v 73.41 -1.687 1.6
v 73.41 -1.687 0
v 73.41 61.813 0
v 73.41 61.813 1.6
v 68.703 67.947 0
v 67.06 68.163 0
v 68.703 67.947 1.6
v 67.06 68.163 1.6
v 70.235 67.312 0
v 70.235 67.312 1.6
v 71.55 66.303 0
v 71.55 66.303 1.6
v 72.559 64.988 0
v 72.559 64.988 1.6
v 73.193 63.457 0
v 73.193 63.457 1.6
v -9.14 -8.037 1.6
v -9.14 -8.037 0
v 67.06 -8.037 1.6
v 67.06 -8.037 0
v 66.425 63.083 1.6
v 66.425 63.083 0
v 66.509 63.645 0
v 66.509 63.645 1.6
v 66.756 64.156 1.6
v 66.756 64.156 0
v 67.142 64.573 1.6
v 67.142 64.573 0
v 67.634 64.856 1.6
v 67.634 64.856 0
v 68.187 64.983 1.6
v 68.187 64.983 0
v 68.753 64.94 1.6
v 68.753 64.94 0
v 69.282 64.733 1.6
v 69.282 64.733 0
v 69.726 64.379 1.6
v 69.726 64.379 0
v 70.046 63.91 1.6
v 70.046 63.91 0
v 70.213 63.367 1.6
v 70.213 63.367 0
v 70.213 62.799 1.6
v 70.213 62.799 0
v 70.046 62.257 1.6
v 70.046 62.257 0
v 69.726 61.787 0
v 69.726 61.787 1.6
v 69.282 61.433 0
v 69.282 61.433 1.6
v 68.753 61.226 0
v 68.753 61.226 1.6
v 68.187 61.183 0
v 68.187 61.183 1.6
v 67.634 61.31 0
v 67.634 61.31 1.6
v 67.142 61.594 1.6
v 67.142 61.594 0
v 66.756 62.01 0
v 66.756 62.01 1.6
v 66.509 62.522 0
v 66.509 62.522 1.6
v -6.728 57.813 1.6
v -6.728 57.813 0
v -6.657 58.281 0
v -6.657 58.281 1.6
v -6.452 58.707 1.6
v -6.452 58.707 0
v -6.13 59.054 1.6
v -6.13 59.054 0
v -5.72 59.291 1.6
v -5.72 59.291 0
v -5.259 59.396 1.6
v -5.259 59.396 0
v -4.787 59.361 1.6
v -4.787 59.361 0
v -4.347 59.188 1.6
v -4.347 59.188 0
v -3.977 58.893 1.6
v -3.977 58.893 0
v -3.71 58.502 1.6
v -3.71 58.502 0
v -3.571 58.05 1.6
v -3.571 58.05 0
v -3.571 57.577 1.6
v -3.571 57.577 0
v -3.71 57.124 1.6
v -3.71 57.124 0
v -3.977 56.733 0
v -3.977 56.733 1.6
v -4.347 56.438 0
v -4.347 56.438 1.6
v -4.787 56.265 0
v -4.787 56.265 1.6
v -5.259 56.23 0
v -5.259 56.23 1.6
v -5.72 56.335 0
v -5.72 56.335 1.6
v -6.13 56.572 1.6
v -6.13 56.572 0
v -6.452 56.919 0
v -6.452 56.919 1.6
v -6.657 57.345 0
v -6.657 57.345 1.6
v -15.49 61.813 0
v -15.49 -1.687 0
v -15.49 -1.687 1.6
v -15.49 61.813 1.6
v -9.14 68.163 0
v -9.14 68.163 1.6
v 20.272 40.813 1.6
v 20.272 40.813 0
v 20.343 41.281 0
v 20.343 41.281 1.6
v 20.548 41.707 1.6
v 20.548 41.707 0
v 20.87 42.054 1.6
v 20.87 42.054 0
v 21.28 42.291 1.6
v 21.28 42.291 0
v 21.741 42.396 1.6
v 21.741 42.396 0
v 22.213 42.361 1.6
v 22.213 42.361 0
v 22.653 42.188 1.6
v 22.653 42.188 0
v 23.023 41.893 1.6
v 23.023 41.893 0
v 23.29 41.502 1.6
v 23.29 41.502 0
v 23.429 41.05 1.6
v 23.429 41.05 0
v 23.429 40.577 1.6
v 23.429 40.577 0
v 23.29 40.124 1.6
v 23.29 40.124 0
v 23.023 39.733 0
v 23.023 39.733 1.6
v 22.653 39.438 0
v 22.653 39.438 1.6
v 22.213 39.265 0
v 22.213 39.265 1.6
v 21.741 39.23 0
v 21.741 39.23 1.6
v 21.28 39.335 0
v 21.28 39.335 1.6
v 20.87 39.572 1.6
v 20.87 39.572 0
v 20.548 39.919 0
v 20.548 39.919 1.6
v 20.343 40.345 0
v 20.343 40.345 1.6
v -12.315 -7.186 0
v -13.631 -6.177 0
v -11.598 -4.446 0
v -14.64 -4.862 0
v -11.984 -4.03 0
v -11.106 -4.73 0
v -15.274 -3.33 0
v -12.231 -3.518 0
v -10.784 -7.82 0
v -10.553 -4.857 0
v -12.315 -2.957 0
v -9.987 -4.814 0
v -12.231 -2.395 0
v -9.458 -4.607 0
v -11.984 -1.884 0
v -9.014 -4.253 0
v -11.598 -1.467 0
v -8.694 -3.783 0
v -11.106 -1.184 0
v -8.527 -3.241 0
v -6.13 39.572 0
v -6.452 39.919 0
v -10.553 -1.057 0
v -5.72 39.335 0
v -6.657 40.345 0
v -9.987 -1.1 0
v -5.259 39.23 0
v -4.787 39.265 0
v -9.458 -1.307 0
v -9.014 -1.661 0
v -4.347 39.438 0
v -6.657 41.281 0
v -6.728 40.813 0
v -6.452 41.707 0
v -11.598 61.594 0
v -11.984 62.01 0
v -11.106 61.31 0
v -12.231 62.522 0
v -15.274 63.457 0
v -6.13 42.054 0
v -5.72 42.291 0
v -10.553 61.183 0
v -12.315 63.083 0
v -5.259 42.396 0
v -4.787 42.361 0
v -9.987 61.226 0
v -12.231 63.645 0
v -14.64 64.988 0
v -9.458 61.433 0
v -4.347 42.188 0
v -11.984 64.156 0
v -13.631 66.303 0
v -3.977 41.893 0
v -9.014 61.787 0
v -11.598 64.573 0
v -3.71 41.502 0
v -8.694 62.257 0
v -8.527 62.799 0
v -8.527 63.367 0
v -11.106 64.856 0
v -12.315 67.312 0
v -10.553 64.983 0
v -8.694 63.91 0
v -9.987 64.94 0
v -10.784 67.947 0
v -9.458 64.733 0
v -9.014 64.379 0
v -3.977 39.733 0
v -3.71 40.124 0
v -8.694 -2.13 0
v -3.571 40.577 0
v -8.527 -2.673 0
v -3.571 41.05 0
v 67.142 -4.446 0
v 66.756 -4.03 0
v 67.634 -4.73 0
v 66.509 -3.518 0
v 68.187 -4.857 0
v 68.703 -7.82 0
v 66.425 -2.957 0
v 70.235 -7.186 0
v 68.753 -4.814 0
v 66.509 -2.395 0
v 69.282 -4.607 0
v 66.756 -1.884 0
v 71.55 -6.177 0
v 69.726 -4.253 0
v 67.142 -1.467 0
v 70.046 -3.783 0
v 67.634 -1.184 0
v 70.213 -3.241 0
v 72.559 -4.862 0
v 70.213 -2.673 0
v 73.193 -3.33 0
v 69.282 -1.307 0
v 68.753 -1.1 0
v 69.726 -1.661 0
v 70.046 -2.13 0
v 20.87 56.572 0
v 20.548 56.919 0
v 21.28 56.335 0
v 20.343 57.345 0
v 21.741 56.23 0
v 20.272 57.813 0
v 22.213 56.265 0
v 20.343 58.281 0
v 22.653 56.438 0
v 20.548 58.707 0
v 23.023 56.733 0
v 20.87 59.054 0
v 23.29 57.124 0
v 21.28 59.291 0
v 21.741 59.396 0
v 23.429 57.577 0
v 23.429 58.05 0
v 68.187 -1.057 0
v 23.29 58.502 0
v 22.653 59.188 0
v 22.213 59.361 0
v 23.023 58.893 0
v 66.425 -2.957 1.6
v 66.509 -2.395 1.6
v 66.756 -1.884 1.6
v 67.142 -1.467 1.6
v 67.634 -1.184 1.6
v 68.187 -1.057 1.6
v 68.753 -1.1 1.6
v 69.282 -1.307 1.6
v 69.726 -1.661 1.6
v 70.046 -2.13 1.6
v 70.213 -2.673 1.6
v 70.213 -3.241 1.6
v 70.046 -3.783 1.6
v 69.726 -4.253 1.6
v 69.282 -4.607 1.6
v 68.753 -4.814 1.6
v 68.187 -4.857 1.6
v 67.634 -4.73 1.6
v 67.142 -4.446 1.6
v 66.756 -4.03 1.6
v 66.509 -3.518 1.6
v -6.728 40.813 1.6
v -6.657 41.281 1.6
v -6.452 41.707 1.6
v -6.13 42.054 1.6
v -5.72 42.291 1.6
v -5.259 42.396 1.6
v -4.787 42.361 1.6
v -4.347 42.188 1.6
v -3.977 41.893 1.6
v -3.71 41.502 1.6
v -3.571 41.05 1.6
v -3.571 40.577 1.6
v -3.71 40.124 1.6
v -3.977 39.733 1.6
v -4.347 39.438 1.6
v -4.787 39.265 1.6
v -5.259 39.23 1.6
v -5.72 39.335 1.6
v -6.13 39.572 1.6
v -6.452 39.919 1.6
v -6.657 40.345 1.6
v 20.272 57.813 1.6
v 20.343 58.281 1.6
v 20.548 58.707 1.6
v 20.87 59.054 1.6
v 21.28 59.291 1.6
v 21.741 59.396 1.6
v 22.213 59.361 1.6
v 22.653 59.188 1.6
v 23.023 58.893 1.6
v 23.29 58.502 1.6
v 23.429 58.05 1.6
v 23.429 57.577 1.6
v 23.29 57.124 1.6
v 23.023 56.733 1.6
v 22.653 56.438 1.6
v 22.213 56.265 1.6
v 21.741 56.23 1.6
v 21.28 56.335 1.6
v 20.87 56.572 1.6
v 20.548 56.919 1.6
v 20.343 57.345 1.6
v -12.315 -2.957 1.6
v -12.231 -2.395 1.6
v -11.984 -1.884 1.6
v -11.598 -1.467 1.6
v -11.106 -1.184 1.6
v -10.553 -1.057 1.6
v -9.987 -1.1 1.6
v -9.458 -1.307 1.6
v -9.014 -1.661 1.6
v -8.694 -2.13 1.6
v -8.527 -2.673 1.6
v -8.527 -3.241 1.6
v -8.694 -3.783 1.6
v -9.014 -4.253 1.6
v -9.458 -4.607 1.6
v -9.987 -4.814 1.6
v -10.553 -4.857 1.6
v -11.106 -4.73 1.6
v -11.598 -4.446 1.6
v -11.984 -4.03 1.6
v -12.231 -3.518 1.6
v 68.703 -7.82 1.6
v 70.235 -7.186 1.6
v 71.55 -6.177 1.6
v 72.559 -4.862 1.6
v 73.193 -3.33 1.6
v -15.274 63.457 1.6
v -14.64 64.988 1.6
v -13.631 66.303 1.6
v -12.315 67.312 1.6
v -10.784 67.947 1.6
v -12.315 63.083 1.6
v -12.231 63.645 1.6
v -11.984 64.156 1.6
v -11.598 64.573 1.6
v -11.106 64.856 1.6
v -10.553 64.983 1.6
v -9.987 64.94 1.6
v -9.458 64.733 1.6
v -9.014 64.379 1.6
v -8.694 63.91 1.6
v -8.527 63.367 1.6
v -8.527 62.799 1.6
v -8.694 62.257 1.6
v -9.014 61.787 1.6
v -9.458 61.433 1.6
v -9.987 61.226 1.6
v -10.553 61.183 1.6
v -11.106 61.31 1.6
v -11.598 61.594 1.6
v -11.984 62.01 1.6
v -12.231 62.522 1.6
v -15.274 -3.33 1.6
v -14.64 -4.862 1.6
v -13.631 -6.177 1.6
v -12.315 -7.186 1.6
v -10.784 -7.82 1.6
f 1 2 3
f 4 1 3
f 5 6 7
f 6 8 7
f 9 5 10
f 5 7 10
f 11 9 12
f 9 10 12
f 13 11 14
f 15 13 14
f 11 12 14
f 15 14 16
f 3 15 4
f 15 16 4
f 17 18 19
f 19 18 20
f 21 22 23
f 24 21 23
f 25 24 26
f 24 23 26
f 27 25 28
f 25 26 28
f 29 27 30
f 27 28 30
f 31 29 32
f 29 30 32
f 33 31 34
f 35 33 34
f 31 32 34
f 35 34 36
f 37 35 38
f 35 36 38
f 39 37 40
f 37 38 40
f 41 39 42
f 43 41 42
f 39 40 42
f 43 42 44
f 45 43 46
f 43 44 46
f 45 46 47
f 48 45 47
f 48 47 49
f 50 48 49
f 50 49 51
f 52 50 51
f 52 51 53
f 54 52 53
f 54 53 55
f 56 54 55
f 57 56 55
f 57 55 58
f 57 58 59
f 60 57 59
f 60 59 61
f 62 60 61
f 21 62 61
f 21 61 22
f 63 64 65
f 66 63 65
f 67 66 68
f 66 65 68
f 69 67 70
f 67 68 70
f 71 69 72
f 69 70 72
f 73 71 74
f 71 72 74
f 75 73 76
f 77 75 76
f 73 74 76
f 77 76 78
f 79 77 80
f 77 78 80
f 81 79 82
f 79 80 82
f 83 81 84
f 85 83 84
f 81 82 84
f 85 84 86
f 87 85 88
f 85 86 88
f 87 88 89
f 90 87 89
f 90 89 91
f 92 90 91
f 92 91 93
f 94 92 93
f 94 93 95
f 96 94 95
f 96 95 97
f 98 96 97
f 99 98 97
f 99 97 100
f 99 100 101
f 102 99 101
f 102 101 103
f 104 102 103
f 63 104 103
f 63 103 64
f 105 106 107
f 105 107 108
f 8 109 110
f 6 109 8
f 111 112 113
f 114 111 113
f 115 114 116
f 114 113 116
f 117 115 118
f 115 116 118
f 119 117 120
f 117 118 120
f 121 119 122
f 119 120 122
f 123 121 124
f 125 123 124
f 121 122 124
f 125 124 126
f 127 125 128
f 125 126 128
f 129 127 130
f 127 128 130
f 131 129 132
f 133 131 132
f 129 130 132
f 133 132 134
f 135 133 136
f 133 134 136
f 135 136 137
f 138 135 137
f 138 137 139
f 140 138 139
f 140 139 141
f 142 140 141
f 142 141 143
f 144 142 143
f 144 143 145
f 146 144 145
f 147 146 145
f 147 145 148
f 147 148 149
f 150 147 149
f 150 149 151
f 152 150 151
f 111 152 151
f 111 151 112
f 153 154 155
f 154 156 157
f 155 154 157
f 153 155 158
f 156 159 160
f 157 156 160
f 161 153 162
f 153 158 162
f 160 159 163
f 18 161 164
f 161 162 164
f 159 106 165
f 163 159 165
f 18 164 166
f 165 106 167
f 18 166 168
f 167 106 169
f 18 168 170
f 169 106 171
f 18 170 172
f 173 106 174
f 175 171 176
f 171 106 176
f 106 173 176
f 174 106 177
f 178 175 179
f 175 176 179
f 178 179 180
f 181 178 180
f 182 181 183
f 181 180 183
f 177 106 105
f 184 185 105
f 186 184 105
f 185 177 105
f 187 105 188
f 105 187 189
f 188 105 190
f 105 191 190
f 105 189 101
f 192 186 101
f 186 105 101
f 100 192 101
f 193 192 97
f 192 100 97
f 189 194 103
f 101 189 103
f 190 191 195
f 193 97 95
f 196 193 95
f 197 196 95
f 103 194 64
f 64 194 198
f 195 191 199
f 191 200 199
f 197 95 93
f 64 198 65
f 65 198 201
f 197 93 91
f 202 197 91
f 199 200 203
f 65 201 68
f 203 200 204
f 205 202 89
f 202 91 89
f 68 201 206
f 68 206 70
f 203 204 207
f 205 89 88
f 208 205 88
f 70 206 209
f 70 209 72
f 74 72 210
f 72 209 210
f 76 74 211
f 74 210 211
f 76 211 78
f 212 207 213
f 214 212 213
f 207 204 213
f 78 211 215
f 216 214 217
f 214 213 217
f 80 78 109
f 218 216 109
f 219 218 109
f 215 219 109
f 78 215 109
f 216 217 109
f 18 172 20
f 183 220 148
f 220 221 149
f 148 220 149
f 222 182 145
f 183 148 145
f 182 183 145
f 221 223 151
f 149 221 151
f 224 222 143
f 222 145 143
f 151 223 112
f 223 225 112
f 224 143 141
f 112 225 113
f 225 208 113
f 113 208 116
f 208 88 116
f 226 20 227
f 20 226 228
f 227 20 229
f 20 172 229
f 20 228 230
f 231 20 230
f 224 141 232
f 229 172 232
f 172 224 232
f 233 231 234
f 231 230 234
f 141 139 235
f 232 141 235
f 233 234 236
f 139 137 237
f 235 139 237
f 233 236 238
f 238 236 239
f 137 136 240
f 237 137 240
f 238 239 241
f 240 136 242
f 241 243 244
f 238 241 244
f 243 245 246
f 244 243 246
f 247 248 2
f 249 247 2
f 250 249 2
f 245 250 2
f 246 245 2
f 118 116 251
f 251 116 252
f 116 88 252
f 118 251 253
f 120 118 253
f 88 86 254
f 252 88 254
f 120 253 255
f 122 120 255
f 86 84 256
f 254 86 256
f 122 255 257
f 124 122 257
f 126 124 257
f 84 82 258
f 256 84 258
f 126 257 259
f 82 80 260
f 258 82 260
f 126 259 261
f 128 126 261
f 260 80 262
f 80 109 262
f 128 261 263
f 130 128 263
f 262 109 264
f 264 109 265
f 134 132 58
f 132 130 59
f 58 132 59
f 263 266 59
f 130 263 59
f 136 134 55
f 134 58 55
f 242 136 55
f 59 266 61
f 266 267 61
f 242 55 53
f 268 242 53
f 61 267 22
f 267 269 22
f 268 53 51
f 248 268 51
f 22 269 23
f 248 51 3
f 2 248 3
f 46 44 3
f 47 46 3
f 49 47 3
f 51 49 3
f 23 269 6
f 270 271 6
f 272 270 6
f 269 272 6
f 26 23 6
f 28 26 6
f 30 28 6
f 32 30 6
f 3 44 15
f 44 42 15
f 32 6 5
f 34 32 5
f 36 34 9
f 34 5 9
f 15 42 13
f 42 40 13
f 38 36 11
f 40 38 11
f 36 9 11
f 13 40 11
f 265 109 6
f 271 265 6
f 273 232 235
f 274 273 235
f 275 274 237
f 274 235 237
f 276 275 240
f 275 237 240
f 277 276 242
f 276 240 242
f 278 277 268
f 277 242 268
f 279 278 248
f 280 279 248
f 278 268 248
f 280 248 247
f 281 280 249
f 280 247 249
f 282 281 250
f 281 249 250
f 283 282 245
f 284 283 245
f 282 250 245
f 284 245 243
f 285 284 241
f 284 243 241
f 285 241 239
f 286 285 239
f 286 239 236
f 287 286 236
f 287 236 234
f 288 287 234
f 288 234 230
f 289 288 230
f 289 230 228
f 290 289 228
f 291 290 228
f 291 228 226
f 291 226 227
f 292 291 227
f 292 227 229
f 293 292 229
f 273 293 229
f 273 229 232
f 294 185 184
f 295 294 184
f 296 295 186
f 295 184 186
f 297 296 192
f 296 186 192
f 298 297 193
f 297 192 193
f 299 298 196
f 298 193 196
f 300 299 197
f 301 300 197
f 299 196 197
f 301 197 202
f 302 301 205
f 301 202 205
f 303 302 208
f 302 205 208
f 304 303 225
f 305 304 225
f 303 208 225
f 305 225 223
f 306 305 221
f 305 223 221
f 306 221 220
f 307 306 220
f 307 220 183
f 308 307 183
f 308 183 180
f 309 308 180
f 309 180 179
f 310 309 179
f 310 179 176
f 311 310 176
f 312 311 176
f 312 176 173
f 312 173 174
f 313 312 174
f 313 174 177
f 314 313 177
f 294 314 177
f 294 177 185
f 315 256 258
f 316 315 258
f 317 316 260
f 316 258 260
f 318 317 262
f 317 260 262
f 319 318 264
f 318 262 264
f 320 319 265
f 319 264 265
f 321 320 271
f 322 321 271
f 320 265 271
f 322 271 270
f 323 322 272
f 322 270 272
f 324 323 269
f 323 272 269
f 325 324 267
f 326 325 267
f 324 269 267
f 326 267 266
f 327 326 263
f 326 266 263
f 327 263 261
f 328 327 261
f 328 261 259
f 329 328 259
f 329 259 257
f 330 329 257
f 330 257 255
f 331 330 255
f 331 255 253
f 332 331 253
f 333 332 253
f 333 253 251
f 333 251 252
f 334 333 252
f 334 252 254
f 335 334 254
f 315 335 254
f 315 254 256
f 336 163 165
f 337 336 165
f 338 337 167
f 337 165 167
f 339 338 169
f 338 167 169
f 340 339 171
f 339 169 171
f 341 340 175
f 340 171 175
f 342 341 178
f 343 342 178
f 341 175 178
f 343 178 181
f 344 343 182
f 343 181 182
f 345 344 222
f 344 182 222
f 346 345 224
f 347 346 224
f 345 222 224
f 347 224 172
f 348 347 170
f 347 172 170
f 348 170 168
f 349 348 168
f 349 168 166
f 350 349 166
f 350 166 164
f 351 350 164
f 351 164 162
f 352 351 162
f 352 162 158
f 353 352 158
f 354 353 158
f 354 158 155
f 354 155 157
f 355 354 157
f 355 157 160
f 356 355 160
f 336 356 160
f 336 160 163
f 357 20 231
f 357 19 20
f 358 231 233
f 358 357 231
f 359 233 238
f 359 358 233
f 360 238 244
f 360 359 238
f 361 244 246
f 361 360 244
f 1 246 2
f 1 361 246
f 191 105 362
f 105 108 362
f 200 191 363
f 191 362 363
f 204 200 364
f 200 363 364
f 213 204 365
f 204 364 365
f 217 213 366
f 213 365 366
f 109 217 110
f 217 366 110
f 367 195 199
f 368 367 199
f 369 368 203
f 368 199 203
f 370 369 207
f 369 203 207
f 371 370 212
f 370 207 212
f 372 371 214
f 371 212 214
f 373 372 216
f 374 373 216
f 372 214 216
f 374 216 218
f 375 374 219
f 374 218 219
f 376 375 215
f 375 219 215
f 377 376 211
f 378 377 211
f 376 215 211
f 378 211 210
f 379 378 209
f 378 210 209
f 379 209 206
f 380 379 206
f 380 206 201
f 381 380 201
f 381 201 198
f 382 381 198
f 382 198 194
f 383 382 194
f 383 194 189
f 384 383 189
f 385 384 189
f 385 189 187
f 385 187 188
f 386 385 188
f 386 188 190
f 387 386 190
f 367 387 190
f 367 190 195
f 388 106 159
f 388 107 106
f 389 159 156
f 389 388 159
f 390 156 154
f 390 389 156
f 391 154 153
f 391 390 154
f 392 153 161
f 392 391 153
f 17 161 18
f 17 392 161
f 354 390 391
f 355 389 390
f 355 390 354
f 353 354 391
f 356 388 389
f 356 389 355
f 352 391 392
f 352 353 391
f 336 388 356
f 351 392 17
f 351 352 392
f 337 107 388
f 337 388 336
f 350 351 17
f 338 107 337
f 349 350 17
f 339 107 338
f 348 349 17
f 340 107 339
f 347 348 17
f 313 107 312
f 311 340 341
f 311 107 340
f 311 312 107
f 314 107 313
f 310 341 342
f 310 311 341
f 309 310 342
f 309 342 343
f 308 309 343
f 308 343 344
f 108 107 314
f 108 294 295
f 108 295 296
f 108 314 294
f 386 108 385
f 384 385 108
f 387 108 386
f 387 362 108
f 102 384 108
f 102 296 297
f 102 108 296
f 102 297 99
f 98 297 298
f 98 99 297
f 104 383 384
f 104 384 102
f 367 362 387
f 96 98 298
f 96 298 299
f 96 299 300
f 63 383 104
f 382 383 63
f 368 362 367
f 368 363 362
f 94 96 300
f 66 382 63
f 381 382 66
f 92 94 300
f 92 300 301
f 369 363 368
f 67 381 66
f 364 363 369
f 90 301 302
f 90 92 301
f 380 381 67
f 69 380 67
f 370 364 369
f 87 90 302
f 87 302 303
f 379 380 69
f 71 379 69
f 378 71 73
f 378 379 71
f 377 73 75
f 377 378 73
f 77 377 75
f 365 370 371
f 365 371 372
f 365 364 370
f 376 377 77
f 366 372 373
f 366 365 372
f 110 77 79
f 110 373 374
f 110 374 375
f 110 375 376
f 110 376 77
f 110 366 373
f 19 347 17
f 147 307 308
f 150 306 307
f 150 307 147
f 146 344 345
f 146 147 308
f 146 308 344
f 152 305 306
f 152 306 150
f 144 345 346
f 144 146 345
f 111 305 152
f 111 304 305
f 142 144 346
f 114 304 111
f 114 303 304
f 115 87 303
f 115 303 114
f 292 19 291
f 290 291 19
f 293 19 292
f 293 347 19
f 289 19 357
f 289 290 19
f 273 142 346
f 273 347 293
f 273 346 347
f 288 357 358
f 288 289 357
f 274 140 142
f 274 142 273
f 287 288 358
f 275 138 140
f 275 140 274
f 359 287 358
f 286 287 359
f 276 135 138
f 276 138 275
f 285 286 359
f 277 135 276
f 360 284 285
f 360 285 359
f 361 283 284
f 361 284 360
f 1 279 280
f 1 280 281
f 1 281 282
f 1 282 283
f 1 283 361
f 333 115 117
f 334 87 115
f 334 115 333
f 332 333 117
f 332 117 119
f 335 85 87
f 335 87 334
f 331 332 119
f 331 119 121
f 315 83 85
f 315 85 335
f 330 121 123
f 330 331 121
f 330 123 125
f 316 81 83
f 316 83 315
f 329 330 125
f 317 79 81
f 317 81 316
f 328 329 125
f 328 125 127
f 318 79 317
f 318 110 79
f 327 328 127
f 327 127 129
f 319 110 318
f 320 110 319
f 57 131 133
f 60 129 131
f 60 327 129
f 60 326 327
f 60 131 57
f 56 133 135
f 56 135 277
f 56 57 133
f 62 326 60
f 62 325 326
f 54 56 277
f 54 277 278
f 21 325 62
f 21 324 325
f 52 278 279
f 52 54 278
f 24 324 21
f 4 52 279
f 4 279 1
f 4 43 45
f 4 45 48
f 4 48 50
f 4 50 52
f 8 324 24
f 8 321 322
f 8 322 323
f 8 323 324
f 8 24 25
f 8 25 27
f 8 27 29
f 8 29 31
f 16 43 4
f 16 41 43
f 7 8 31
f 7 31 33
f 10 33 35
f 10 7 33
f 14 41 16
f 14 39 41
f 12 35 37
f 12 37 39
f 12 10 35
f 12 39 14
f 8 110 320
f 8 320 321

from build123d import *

# Parameters (mm, degrees)
SKETCH1_W           = 88.9
SKETCH1_H           = 76.2
BOSS_EXTRUDE1_DEPTH = 1.6
SKETCH2_R           = 1.5875
CUT_EXTRUDE1_DEPTH  = 2.6
SKETCH4_R           = 1.905
CUT_EXTRUDE2_DEPTH  = 2.6
FILLET1_R           = 6.35


with BuildPart() as part:
    # Sketch1 → Boss-Extrude1 (new body)
    with BuildSketch(Plane.XY):
        with Locations((28.959521177, 30.063142475)):
            Rectangle(SKETCH1_W, SKETCH1_H)
    extrude(amount=BOSS_EXTRUDE1_DEPTH)

    # Sketch2 → Cut-Extrude1 (cut, through all)
    with BuildSketch(Plane(origin=(0, 0, 0), x_dir=(-1, 0, 0), z_dir=(0, 0, -1))):
        with Locations((5.140478823, 57.813142475)):
            Circle(SKETCH2_R)
        with Locations((-21.859521177, 57.813142475)):
            Circle(SKETCH2_R)
        with Locations((-21.859521177, 40.813142475)):
            Circle(SKETCH2_R)
        with Locations((5.140478823, 40.813142475)):
            Circle(SKETCH2_R)
    extrude(amount=-CUT_EXTRUDE1_DEPTH, mode=Mode.SUBTRACT)

    # Sketch4 → Cut-Extrude2 (cut, through all)
    with BuildSketch(Plane(origin=(0, 0, 0), x_dir=(-1, 0, 0), z_dir=(0, 0, -1))):
        with Locations((10.410478823, 63.083142475)):
            Circle(SKETCH4_R)
        with Locations((-68.329521177, 63.083142475)):
            Circle(SKETCH4_R)
        with Locations((-68.329521177, -2.956857525)):
            Circle(SKETCH4_R)
        with Locations((10.410478823, -2.956857525)):
            Circle(SKETCH4_R)
    extrude(amount=-CUT_EXTRUDE2_DEPTH, mode=Mode.SUBTRACT)

    # Fillet1
    fillet1_edges = [part.edges().sort_by_distance(p)[0] for p in [
        (-15.490478823, 68.163142475, 0.8),
        (73.409521177, 68.163142475, 0.8),
        (73.409521177, -8.036857525, 0.8),
        (-15.490478823, -8.036857525, 0.8),
    ]]
    fillet(fillet1_edges, radius=FILLET1_R)


solid = part.part
